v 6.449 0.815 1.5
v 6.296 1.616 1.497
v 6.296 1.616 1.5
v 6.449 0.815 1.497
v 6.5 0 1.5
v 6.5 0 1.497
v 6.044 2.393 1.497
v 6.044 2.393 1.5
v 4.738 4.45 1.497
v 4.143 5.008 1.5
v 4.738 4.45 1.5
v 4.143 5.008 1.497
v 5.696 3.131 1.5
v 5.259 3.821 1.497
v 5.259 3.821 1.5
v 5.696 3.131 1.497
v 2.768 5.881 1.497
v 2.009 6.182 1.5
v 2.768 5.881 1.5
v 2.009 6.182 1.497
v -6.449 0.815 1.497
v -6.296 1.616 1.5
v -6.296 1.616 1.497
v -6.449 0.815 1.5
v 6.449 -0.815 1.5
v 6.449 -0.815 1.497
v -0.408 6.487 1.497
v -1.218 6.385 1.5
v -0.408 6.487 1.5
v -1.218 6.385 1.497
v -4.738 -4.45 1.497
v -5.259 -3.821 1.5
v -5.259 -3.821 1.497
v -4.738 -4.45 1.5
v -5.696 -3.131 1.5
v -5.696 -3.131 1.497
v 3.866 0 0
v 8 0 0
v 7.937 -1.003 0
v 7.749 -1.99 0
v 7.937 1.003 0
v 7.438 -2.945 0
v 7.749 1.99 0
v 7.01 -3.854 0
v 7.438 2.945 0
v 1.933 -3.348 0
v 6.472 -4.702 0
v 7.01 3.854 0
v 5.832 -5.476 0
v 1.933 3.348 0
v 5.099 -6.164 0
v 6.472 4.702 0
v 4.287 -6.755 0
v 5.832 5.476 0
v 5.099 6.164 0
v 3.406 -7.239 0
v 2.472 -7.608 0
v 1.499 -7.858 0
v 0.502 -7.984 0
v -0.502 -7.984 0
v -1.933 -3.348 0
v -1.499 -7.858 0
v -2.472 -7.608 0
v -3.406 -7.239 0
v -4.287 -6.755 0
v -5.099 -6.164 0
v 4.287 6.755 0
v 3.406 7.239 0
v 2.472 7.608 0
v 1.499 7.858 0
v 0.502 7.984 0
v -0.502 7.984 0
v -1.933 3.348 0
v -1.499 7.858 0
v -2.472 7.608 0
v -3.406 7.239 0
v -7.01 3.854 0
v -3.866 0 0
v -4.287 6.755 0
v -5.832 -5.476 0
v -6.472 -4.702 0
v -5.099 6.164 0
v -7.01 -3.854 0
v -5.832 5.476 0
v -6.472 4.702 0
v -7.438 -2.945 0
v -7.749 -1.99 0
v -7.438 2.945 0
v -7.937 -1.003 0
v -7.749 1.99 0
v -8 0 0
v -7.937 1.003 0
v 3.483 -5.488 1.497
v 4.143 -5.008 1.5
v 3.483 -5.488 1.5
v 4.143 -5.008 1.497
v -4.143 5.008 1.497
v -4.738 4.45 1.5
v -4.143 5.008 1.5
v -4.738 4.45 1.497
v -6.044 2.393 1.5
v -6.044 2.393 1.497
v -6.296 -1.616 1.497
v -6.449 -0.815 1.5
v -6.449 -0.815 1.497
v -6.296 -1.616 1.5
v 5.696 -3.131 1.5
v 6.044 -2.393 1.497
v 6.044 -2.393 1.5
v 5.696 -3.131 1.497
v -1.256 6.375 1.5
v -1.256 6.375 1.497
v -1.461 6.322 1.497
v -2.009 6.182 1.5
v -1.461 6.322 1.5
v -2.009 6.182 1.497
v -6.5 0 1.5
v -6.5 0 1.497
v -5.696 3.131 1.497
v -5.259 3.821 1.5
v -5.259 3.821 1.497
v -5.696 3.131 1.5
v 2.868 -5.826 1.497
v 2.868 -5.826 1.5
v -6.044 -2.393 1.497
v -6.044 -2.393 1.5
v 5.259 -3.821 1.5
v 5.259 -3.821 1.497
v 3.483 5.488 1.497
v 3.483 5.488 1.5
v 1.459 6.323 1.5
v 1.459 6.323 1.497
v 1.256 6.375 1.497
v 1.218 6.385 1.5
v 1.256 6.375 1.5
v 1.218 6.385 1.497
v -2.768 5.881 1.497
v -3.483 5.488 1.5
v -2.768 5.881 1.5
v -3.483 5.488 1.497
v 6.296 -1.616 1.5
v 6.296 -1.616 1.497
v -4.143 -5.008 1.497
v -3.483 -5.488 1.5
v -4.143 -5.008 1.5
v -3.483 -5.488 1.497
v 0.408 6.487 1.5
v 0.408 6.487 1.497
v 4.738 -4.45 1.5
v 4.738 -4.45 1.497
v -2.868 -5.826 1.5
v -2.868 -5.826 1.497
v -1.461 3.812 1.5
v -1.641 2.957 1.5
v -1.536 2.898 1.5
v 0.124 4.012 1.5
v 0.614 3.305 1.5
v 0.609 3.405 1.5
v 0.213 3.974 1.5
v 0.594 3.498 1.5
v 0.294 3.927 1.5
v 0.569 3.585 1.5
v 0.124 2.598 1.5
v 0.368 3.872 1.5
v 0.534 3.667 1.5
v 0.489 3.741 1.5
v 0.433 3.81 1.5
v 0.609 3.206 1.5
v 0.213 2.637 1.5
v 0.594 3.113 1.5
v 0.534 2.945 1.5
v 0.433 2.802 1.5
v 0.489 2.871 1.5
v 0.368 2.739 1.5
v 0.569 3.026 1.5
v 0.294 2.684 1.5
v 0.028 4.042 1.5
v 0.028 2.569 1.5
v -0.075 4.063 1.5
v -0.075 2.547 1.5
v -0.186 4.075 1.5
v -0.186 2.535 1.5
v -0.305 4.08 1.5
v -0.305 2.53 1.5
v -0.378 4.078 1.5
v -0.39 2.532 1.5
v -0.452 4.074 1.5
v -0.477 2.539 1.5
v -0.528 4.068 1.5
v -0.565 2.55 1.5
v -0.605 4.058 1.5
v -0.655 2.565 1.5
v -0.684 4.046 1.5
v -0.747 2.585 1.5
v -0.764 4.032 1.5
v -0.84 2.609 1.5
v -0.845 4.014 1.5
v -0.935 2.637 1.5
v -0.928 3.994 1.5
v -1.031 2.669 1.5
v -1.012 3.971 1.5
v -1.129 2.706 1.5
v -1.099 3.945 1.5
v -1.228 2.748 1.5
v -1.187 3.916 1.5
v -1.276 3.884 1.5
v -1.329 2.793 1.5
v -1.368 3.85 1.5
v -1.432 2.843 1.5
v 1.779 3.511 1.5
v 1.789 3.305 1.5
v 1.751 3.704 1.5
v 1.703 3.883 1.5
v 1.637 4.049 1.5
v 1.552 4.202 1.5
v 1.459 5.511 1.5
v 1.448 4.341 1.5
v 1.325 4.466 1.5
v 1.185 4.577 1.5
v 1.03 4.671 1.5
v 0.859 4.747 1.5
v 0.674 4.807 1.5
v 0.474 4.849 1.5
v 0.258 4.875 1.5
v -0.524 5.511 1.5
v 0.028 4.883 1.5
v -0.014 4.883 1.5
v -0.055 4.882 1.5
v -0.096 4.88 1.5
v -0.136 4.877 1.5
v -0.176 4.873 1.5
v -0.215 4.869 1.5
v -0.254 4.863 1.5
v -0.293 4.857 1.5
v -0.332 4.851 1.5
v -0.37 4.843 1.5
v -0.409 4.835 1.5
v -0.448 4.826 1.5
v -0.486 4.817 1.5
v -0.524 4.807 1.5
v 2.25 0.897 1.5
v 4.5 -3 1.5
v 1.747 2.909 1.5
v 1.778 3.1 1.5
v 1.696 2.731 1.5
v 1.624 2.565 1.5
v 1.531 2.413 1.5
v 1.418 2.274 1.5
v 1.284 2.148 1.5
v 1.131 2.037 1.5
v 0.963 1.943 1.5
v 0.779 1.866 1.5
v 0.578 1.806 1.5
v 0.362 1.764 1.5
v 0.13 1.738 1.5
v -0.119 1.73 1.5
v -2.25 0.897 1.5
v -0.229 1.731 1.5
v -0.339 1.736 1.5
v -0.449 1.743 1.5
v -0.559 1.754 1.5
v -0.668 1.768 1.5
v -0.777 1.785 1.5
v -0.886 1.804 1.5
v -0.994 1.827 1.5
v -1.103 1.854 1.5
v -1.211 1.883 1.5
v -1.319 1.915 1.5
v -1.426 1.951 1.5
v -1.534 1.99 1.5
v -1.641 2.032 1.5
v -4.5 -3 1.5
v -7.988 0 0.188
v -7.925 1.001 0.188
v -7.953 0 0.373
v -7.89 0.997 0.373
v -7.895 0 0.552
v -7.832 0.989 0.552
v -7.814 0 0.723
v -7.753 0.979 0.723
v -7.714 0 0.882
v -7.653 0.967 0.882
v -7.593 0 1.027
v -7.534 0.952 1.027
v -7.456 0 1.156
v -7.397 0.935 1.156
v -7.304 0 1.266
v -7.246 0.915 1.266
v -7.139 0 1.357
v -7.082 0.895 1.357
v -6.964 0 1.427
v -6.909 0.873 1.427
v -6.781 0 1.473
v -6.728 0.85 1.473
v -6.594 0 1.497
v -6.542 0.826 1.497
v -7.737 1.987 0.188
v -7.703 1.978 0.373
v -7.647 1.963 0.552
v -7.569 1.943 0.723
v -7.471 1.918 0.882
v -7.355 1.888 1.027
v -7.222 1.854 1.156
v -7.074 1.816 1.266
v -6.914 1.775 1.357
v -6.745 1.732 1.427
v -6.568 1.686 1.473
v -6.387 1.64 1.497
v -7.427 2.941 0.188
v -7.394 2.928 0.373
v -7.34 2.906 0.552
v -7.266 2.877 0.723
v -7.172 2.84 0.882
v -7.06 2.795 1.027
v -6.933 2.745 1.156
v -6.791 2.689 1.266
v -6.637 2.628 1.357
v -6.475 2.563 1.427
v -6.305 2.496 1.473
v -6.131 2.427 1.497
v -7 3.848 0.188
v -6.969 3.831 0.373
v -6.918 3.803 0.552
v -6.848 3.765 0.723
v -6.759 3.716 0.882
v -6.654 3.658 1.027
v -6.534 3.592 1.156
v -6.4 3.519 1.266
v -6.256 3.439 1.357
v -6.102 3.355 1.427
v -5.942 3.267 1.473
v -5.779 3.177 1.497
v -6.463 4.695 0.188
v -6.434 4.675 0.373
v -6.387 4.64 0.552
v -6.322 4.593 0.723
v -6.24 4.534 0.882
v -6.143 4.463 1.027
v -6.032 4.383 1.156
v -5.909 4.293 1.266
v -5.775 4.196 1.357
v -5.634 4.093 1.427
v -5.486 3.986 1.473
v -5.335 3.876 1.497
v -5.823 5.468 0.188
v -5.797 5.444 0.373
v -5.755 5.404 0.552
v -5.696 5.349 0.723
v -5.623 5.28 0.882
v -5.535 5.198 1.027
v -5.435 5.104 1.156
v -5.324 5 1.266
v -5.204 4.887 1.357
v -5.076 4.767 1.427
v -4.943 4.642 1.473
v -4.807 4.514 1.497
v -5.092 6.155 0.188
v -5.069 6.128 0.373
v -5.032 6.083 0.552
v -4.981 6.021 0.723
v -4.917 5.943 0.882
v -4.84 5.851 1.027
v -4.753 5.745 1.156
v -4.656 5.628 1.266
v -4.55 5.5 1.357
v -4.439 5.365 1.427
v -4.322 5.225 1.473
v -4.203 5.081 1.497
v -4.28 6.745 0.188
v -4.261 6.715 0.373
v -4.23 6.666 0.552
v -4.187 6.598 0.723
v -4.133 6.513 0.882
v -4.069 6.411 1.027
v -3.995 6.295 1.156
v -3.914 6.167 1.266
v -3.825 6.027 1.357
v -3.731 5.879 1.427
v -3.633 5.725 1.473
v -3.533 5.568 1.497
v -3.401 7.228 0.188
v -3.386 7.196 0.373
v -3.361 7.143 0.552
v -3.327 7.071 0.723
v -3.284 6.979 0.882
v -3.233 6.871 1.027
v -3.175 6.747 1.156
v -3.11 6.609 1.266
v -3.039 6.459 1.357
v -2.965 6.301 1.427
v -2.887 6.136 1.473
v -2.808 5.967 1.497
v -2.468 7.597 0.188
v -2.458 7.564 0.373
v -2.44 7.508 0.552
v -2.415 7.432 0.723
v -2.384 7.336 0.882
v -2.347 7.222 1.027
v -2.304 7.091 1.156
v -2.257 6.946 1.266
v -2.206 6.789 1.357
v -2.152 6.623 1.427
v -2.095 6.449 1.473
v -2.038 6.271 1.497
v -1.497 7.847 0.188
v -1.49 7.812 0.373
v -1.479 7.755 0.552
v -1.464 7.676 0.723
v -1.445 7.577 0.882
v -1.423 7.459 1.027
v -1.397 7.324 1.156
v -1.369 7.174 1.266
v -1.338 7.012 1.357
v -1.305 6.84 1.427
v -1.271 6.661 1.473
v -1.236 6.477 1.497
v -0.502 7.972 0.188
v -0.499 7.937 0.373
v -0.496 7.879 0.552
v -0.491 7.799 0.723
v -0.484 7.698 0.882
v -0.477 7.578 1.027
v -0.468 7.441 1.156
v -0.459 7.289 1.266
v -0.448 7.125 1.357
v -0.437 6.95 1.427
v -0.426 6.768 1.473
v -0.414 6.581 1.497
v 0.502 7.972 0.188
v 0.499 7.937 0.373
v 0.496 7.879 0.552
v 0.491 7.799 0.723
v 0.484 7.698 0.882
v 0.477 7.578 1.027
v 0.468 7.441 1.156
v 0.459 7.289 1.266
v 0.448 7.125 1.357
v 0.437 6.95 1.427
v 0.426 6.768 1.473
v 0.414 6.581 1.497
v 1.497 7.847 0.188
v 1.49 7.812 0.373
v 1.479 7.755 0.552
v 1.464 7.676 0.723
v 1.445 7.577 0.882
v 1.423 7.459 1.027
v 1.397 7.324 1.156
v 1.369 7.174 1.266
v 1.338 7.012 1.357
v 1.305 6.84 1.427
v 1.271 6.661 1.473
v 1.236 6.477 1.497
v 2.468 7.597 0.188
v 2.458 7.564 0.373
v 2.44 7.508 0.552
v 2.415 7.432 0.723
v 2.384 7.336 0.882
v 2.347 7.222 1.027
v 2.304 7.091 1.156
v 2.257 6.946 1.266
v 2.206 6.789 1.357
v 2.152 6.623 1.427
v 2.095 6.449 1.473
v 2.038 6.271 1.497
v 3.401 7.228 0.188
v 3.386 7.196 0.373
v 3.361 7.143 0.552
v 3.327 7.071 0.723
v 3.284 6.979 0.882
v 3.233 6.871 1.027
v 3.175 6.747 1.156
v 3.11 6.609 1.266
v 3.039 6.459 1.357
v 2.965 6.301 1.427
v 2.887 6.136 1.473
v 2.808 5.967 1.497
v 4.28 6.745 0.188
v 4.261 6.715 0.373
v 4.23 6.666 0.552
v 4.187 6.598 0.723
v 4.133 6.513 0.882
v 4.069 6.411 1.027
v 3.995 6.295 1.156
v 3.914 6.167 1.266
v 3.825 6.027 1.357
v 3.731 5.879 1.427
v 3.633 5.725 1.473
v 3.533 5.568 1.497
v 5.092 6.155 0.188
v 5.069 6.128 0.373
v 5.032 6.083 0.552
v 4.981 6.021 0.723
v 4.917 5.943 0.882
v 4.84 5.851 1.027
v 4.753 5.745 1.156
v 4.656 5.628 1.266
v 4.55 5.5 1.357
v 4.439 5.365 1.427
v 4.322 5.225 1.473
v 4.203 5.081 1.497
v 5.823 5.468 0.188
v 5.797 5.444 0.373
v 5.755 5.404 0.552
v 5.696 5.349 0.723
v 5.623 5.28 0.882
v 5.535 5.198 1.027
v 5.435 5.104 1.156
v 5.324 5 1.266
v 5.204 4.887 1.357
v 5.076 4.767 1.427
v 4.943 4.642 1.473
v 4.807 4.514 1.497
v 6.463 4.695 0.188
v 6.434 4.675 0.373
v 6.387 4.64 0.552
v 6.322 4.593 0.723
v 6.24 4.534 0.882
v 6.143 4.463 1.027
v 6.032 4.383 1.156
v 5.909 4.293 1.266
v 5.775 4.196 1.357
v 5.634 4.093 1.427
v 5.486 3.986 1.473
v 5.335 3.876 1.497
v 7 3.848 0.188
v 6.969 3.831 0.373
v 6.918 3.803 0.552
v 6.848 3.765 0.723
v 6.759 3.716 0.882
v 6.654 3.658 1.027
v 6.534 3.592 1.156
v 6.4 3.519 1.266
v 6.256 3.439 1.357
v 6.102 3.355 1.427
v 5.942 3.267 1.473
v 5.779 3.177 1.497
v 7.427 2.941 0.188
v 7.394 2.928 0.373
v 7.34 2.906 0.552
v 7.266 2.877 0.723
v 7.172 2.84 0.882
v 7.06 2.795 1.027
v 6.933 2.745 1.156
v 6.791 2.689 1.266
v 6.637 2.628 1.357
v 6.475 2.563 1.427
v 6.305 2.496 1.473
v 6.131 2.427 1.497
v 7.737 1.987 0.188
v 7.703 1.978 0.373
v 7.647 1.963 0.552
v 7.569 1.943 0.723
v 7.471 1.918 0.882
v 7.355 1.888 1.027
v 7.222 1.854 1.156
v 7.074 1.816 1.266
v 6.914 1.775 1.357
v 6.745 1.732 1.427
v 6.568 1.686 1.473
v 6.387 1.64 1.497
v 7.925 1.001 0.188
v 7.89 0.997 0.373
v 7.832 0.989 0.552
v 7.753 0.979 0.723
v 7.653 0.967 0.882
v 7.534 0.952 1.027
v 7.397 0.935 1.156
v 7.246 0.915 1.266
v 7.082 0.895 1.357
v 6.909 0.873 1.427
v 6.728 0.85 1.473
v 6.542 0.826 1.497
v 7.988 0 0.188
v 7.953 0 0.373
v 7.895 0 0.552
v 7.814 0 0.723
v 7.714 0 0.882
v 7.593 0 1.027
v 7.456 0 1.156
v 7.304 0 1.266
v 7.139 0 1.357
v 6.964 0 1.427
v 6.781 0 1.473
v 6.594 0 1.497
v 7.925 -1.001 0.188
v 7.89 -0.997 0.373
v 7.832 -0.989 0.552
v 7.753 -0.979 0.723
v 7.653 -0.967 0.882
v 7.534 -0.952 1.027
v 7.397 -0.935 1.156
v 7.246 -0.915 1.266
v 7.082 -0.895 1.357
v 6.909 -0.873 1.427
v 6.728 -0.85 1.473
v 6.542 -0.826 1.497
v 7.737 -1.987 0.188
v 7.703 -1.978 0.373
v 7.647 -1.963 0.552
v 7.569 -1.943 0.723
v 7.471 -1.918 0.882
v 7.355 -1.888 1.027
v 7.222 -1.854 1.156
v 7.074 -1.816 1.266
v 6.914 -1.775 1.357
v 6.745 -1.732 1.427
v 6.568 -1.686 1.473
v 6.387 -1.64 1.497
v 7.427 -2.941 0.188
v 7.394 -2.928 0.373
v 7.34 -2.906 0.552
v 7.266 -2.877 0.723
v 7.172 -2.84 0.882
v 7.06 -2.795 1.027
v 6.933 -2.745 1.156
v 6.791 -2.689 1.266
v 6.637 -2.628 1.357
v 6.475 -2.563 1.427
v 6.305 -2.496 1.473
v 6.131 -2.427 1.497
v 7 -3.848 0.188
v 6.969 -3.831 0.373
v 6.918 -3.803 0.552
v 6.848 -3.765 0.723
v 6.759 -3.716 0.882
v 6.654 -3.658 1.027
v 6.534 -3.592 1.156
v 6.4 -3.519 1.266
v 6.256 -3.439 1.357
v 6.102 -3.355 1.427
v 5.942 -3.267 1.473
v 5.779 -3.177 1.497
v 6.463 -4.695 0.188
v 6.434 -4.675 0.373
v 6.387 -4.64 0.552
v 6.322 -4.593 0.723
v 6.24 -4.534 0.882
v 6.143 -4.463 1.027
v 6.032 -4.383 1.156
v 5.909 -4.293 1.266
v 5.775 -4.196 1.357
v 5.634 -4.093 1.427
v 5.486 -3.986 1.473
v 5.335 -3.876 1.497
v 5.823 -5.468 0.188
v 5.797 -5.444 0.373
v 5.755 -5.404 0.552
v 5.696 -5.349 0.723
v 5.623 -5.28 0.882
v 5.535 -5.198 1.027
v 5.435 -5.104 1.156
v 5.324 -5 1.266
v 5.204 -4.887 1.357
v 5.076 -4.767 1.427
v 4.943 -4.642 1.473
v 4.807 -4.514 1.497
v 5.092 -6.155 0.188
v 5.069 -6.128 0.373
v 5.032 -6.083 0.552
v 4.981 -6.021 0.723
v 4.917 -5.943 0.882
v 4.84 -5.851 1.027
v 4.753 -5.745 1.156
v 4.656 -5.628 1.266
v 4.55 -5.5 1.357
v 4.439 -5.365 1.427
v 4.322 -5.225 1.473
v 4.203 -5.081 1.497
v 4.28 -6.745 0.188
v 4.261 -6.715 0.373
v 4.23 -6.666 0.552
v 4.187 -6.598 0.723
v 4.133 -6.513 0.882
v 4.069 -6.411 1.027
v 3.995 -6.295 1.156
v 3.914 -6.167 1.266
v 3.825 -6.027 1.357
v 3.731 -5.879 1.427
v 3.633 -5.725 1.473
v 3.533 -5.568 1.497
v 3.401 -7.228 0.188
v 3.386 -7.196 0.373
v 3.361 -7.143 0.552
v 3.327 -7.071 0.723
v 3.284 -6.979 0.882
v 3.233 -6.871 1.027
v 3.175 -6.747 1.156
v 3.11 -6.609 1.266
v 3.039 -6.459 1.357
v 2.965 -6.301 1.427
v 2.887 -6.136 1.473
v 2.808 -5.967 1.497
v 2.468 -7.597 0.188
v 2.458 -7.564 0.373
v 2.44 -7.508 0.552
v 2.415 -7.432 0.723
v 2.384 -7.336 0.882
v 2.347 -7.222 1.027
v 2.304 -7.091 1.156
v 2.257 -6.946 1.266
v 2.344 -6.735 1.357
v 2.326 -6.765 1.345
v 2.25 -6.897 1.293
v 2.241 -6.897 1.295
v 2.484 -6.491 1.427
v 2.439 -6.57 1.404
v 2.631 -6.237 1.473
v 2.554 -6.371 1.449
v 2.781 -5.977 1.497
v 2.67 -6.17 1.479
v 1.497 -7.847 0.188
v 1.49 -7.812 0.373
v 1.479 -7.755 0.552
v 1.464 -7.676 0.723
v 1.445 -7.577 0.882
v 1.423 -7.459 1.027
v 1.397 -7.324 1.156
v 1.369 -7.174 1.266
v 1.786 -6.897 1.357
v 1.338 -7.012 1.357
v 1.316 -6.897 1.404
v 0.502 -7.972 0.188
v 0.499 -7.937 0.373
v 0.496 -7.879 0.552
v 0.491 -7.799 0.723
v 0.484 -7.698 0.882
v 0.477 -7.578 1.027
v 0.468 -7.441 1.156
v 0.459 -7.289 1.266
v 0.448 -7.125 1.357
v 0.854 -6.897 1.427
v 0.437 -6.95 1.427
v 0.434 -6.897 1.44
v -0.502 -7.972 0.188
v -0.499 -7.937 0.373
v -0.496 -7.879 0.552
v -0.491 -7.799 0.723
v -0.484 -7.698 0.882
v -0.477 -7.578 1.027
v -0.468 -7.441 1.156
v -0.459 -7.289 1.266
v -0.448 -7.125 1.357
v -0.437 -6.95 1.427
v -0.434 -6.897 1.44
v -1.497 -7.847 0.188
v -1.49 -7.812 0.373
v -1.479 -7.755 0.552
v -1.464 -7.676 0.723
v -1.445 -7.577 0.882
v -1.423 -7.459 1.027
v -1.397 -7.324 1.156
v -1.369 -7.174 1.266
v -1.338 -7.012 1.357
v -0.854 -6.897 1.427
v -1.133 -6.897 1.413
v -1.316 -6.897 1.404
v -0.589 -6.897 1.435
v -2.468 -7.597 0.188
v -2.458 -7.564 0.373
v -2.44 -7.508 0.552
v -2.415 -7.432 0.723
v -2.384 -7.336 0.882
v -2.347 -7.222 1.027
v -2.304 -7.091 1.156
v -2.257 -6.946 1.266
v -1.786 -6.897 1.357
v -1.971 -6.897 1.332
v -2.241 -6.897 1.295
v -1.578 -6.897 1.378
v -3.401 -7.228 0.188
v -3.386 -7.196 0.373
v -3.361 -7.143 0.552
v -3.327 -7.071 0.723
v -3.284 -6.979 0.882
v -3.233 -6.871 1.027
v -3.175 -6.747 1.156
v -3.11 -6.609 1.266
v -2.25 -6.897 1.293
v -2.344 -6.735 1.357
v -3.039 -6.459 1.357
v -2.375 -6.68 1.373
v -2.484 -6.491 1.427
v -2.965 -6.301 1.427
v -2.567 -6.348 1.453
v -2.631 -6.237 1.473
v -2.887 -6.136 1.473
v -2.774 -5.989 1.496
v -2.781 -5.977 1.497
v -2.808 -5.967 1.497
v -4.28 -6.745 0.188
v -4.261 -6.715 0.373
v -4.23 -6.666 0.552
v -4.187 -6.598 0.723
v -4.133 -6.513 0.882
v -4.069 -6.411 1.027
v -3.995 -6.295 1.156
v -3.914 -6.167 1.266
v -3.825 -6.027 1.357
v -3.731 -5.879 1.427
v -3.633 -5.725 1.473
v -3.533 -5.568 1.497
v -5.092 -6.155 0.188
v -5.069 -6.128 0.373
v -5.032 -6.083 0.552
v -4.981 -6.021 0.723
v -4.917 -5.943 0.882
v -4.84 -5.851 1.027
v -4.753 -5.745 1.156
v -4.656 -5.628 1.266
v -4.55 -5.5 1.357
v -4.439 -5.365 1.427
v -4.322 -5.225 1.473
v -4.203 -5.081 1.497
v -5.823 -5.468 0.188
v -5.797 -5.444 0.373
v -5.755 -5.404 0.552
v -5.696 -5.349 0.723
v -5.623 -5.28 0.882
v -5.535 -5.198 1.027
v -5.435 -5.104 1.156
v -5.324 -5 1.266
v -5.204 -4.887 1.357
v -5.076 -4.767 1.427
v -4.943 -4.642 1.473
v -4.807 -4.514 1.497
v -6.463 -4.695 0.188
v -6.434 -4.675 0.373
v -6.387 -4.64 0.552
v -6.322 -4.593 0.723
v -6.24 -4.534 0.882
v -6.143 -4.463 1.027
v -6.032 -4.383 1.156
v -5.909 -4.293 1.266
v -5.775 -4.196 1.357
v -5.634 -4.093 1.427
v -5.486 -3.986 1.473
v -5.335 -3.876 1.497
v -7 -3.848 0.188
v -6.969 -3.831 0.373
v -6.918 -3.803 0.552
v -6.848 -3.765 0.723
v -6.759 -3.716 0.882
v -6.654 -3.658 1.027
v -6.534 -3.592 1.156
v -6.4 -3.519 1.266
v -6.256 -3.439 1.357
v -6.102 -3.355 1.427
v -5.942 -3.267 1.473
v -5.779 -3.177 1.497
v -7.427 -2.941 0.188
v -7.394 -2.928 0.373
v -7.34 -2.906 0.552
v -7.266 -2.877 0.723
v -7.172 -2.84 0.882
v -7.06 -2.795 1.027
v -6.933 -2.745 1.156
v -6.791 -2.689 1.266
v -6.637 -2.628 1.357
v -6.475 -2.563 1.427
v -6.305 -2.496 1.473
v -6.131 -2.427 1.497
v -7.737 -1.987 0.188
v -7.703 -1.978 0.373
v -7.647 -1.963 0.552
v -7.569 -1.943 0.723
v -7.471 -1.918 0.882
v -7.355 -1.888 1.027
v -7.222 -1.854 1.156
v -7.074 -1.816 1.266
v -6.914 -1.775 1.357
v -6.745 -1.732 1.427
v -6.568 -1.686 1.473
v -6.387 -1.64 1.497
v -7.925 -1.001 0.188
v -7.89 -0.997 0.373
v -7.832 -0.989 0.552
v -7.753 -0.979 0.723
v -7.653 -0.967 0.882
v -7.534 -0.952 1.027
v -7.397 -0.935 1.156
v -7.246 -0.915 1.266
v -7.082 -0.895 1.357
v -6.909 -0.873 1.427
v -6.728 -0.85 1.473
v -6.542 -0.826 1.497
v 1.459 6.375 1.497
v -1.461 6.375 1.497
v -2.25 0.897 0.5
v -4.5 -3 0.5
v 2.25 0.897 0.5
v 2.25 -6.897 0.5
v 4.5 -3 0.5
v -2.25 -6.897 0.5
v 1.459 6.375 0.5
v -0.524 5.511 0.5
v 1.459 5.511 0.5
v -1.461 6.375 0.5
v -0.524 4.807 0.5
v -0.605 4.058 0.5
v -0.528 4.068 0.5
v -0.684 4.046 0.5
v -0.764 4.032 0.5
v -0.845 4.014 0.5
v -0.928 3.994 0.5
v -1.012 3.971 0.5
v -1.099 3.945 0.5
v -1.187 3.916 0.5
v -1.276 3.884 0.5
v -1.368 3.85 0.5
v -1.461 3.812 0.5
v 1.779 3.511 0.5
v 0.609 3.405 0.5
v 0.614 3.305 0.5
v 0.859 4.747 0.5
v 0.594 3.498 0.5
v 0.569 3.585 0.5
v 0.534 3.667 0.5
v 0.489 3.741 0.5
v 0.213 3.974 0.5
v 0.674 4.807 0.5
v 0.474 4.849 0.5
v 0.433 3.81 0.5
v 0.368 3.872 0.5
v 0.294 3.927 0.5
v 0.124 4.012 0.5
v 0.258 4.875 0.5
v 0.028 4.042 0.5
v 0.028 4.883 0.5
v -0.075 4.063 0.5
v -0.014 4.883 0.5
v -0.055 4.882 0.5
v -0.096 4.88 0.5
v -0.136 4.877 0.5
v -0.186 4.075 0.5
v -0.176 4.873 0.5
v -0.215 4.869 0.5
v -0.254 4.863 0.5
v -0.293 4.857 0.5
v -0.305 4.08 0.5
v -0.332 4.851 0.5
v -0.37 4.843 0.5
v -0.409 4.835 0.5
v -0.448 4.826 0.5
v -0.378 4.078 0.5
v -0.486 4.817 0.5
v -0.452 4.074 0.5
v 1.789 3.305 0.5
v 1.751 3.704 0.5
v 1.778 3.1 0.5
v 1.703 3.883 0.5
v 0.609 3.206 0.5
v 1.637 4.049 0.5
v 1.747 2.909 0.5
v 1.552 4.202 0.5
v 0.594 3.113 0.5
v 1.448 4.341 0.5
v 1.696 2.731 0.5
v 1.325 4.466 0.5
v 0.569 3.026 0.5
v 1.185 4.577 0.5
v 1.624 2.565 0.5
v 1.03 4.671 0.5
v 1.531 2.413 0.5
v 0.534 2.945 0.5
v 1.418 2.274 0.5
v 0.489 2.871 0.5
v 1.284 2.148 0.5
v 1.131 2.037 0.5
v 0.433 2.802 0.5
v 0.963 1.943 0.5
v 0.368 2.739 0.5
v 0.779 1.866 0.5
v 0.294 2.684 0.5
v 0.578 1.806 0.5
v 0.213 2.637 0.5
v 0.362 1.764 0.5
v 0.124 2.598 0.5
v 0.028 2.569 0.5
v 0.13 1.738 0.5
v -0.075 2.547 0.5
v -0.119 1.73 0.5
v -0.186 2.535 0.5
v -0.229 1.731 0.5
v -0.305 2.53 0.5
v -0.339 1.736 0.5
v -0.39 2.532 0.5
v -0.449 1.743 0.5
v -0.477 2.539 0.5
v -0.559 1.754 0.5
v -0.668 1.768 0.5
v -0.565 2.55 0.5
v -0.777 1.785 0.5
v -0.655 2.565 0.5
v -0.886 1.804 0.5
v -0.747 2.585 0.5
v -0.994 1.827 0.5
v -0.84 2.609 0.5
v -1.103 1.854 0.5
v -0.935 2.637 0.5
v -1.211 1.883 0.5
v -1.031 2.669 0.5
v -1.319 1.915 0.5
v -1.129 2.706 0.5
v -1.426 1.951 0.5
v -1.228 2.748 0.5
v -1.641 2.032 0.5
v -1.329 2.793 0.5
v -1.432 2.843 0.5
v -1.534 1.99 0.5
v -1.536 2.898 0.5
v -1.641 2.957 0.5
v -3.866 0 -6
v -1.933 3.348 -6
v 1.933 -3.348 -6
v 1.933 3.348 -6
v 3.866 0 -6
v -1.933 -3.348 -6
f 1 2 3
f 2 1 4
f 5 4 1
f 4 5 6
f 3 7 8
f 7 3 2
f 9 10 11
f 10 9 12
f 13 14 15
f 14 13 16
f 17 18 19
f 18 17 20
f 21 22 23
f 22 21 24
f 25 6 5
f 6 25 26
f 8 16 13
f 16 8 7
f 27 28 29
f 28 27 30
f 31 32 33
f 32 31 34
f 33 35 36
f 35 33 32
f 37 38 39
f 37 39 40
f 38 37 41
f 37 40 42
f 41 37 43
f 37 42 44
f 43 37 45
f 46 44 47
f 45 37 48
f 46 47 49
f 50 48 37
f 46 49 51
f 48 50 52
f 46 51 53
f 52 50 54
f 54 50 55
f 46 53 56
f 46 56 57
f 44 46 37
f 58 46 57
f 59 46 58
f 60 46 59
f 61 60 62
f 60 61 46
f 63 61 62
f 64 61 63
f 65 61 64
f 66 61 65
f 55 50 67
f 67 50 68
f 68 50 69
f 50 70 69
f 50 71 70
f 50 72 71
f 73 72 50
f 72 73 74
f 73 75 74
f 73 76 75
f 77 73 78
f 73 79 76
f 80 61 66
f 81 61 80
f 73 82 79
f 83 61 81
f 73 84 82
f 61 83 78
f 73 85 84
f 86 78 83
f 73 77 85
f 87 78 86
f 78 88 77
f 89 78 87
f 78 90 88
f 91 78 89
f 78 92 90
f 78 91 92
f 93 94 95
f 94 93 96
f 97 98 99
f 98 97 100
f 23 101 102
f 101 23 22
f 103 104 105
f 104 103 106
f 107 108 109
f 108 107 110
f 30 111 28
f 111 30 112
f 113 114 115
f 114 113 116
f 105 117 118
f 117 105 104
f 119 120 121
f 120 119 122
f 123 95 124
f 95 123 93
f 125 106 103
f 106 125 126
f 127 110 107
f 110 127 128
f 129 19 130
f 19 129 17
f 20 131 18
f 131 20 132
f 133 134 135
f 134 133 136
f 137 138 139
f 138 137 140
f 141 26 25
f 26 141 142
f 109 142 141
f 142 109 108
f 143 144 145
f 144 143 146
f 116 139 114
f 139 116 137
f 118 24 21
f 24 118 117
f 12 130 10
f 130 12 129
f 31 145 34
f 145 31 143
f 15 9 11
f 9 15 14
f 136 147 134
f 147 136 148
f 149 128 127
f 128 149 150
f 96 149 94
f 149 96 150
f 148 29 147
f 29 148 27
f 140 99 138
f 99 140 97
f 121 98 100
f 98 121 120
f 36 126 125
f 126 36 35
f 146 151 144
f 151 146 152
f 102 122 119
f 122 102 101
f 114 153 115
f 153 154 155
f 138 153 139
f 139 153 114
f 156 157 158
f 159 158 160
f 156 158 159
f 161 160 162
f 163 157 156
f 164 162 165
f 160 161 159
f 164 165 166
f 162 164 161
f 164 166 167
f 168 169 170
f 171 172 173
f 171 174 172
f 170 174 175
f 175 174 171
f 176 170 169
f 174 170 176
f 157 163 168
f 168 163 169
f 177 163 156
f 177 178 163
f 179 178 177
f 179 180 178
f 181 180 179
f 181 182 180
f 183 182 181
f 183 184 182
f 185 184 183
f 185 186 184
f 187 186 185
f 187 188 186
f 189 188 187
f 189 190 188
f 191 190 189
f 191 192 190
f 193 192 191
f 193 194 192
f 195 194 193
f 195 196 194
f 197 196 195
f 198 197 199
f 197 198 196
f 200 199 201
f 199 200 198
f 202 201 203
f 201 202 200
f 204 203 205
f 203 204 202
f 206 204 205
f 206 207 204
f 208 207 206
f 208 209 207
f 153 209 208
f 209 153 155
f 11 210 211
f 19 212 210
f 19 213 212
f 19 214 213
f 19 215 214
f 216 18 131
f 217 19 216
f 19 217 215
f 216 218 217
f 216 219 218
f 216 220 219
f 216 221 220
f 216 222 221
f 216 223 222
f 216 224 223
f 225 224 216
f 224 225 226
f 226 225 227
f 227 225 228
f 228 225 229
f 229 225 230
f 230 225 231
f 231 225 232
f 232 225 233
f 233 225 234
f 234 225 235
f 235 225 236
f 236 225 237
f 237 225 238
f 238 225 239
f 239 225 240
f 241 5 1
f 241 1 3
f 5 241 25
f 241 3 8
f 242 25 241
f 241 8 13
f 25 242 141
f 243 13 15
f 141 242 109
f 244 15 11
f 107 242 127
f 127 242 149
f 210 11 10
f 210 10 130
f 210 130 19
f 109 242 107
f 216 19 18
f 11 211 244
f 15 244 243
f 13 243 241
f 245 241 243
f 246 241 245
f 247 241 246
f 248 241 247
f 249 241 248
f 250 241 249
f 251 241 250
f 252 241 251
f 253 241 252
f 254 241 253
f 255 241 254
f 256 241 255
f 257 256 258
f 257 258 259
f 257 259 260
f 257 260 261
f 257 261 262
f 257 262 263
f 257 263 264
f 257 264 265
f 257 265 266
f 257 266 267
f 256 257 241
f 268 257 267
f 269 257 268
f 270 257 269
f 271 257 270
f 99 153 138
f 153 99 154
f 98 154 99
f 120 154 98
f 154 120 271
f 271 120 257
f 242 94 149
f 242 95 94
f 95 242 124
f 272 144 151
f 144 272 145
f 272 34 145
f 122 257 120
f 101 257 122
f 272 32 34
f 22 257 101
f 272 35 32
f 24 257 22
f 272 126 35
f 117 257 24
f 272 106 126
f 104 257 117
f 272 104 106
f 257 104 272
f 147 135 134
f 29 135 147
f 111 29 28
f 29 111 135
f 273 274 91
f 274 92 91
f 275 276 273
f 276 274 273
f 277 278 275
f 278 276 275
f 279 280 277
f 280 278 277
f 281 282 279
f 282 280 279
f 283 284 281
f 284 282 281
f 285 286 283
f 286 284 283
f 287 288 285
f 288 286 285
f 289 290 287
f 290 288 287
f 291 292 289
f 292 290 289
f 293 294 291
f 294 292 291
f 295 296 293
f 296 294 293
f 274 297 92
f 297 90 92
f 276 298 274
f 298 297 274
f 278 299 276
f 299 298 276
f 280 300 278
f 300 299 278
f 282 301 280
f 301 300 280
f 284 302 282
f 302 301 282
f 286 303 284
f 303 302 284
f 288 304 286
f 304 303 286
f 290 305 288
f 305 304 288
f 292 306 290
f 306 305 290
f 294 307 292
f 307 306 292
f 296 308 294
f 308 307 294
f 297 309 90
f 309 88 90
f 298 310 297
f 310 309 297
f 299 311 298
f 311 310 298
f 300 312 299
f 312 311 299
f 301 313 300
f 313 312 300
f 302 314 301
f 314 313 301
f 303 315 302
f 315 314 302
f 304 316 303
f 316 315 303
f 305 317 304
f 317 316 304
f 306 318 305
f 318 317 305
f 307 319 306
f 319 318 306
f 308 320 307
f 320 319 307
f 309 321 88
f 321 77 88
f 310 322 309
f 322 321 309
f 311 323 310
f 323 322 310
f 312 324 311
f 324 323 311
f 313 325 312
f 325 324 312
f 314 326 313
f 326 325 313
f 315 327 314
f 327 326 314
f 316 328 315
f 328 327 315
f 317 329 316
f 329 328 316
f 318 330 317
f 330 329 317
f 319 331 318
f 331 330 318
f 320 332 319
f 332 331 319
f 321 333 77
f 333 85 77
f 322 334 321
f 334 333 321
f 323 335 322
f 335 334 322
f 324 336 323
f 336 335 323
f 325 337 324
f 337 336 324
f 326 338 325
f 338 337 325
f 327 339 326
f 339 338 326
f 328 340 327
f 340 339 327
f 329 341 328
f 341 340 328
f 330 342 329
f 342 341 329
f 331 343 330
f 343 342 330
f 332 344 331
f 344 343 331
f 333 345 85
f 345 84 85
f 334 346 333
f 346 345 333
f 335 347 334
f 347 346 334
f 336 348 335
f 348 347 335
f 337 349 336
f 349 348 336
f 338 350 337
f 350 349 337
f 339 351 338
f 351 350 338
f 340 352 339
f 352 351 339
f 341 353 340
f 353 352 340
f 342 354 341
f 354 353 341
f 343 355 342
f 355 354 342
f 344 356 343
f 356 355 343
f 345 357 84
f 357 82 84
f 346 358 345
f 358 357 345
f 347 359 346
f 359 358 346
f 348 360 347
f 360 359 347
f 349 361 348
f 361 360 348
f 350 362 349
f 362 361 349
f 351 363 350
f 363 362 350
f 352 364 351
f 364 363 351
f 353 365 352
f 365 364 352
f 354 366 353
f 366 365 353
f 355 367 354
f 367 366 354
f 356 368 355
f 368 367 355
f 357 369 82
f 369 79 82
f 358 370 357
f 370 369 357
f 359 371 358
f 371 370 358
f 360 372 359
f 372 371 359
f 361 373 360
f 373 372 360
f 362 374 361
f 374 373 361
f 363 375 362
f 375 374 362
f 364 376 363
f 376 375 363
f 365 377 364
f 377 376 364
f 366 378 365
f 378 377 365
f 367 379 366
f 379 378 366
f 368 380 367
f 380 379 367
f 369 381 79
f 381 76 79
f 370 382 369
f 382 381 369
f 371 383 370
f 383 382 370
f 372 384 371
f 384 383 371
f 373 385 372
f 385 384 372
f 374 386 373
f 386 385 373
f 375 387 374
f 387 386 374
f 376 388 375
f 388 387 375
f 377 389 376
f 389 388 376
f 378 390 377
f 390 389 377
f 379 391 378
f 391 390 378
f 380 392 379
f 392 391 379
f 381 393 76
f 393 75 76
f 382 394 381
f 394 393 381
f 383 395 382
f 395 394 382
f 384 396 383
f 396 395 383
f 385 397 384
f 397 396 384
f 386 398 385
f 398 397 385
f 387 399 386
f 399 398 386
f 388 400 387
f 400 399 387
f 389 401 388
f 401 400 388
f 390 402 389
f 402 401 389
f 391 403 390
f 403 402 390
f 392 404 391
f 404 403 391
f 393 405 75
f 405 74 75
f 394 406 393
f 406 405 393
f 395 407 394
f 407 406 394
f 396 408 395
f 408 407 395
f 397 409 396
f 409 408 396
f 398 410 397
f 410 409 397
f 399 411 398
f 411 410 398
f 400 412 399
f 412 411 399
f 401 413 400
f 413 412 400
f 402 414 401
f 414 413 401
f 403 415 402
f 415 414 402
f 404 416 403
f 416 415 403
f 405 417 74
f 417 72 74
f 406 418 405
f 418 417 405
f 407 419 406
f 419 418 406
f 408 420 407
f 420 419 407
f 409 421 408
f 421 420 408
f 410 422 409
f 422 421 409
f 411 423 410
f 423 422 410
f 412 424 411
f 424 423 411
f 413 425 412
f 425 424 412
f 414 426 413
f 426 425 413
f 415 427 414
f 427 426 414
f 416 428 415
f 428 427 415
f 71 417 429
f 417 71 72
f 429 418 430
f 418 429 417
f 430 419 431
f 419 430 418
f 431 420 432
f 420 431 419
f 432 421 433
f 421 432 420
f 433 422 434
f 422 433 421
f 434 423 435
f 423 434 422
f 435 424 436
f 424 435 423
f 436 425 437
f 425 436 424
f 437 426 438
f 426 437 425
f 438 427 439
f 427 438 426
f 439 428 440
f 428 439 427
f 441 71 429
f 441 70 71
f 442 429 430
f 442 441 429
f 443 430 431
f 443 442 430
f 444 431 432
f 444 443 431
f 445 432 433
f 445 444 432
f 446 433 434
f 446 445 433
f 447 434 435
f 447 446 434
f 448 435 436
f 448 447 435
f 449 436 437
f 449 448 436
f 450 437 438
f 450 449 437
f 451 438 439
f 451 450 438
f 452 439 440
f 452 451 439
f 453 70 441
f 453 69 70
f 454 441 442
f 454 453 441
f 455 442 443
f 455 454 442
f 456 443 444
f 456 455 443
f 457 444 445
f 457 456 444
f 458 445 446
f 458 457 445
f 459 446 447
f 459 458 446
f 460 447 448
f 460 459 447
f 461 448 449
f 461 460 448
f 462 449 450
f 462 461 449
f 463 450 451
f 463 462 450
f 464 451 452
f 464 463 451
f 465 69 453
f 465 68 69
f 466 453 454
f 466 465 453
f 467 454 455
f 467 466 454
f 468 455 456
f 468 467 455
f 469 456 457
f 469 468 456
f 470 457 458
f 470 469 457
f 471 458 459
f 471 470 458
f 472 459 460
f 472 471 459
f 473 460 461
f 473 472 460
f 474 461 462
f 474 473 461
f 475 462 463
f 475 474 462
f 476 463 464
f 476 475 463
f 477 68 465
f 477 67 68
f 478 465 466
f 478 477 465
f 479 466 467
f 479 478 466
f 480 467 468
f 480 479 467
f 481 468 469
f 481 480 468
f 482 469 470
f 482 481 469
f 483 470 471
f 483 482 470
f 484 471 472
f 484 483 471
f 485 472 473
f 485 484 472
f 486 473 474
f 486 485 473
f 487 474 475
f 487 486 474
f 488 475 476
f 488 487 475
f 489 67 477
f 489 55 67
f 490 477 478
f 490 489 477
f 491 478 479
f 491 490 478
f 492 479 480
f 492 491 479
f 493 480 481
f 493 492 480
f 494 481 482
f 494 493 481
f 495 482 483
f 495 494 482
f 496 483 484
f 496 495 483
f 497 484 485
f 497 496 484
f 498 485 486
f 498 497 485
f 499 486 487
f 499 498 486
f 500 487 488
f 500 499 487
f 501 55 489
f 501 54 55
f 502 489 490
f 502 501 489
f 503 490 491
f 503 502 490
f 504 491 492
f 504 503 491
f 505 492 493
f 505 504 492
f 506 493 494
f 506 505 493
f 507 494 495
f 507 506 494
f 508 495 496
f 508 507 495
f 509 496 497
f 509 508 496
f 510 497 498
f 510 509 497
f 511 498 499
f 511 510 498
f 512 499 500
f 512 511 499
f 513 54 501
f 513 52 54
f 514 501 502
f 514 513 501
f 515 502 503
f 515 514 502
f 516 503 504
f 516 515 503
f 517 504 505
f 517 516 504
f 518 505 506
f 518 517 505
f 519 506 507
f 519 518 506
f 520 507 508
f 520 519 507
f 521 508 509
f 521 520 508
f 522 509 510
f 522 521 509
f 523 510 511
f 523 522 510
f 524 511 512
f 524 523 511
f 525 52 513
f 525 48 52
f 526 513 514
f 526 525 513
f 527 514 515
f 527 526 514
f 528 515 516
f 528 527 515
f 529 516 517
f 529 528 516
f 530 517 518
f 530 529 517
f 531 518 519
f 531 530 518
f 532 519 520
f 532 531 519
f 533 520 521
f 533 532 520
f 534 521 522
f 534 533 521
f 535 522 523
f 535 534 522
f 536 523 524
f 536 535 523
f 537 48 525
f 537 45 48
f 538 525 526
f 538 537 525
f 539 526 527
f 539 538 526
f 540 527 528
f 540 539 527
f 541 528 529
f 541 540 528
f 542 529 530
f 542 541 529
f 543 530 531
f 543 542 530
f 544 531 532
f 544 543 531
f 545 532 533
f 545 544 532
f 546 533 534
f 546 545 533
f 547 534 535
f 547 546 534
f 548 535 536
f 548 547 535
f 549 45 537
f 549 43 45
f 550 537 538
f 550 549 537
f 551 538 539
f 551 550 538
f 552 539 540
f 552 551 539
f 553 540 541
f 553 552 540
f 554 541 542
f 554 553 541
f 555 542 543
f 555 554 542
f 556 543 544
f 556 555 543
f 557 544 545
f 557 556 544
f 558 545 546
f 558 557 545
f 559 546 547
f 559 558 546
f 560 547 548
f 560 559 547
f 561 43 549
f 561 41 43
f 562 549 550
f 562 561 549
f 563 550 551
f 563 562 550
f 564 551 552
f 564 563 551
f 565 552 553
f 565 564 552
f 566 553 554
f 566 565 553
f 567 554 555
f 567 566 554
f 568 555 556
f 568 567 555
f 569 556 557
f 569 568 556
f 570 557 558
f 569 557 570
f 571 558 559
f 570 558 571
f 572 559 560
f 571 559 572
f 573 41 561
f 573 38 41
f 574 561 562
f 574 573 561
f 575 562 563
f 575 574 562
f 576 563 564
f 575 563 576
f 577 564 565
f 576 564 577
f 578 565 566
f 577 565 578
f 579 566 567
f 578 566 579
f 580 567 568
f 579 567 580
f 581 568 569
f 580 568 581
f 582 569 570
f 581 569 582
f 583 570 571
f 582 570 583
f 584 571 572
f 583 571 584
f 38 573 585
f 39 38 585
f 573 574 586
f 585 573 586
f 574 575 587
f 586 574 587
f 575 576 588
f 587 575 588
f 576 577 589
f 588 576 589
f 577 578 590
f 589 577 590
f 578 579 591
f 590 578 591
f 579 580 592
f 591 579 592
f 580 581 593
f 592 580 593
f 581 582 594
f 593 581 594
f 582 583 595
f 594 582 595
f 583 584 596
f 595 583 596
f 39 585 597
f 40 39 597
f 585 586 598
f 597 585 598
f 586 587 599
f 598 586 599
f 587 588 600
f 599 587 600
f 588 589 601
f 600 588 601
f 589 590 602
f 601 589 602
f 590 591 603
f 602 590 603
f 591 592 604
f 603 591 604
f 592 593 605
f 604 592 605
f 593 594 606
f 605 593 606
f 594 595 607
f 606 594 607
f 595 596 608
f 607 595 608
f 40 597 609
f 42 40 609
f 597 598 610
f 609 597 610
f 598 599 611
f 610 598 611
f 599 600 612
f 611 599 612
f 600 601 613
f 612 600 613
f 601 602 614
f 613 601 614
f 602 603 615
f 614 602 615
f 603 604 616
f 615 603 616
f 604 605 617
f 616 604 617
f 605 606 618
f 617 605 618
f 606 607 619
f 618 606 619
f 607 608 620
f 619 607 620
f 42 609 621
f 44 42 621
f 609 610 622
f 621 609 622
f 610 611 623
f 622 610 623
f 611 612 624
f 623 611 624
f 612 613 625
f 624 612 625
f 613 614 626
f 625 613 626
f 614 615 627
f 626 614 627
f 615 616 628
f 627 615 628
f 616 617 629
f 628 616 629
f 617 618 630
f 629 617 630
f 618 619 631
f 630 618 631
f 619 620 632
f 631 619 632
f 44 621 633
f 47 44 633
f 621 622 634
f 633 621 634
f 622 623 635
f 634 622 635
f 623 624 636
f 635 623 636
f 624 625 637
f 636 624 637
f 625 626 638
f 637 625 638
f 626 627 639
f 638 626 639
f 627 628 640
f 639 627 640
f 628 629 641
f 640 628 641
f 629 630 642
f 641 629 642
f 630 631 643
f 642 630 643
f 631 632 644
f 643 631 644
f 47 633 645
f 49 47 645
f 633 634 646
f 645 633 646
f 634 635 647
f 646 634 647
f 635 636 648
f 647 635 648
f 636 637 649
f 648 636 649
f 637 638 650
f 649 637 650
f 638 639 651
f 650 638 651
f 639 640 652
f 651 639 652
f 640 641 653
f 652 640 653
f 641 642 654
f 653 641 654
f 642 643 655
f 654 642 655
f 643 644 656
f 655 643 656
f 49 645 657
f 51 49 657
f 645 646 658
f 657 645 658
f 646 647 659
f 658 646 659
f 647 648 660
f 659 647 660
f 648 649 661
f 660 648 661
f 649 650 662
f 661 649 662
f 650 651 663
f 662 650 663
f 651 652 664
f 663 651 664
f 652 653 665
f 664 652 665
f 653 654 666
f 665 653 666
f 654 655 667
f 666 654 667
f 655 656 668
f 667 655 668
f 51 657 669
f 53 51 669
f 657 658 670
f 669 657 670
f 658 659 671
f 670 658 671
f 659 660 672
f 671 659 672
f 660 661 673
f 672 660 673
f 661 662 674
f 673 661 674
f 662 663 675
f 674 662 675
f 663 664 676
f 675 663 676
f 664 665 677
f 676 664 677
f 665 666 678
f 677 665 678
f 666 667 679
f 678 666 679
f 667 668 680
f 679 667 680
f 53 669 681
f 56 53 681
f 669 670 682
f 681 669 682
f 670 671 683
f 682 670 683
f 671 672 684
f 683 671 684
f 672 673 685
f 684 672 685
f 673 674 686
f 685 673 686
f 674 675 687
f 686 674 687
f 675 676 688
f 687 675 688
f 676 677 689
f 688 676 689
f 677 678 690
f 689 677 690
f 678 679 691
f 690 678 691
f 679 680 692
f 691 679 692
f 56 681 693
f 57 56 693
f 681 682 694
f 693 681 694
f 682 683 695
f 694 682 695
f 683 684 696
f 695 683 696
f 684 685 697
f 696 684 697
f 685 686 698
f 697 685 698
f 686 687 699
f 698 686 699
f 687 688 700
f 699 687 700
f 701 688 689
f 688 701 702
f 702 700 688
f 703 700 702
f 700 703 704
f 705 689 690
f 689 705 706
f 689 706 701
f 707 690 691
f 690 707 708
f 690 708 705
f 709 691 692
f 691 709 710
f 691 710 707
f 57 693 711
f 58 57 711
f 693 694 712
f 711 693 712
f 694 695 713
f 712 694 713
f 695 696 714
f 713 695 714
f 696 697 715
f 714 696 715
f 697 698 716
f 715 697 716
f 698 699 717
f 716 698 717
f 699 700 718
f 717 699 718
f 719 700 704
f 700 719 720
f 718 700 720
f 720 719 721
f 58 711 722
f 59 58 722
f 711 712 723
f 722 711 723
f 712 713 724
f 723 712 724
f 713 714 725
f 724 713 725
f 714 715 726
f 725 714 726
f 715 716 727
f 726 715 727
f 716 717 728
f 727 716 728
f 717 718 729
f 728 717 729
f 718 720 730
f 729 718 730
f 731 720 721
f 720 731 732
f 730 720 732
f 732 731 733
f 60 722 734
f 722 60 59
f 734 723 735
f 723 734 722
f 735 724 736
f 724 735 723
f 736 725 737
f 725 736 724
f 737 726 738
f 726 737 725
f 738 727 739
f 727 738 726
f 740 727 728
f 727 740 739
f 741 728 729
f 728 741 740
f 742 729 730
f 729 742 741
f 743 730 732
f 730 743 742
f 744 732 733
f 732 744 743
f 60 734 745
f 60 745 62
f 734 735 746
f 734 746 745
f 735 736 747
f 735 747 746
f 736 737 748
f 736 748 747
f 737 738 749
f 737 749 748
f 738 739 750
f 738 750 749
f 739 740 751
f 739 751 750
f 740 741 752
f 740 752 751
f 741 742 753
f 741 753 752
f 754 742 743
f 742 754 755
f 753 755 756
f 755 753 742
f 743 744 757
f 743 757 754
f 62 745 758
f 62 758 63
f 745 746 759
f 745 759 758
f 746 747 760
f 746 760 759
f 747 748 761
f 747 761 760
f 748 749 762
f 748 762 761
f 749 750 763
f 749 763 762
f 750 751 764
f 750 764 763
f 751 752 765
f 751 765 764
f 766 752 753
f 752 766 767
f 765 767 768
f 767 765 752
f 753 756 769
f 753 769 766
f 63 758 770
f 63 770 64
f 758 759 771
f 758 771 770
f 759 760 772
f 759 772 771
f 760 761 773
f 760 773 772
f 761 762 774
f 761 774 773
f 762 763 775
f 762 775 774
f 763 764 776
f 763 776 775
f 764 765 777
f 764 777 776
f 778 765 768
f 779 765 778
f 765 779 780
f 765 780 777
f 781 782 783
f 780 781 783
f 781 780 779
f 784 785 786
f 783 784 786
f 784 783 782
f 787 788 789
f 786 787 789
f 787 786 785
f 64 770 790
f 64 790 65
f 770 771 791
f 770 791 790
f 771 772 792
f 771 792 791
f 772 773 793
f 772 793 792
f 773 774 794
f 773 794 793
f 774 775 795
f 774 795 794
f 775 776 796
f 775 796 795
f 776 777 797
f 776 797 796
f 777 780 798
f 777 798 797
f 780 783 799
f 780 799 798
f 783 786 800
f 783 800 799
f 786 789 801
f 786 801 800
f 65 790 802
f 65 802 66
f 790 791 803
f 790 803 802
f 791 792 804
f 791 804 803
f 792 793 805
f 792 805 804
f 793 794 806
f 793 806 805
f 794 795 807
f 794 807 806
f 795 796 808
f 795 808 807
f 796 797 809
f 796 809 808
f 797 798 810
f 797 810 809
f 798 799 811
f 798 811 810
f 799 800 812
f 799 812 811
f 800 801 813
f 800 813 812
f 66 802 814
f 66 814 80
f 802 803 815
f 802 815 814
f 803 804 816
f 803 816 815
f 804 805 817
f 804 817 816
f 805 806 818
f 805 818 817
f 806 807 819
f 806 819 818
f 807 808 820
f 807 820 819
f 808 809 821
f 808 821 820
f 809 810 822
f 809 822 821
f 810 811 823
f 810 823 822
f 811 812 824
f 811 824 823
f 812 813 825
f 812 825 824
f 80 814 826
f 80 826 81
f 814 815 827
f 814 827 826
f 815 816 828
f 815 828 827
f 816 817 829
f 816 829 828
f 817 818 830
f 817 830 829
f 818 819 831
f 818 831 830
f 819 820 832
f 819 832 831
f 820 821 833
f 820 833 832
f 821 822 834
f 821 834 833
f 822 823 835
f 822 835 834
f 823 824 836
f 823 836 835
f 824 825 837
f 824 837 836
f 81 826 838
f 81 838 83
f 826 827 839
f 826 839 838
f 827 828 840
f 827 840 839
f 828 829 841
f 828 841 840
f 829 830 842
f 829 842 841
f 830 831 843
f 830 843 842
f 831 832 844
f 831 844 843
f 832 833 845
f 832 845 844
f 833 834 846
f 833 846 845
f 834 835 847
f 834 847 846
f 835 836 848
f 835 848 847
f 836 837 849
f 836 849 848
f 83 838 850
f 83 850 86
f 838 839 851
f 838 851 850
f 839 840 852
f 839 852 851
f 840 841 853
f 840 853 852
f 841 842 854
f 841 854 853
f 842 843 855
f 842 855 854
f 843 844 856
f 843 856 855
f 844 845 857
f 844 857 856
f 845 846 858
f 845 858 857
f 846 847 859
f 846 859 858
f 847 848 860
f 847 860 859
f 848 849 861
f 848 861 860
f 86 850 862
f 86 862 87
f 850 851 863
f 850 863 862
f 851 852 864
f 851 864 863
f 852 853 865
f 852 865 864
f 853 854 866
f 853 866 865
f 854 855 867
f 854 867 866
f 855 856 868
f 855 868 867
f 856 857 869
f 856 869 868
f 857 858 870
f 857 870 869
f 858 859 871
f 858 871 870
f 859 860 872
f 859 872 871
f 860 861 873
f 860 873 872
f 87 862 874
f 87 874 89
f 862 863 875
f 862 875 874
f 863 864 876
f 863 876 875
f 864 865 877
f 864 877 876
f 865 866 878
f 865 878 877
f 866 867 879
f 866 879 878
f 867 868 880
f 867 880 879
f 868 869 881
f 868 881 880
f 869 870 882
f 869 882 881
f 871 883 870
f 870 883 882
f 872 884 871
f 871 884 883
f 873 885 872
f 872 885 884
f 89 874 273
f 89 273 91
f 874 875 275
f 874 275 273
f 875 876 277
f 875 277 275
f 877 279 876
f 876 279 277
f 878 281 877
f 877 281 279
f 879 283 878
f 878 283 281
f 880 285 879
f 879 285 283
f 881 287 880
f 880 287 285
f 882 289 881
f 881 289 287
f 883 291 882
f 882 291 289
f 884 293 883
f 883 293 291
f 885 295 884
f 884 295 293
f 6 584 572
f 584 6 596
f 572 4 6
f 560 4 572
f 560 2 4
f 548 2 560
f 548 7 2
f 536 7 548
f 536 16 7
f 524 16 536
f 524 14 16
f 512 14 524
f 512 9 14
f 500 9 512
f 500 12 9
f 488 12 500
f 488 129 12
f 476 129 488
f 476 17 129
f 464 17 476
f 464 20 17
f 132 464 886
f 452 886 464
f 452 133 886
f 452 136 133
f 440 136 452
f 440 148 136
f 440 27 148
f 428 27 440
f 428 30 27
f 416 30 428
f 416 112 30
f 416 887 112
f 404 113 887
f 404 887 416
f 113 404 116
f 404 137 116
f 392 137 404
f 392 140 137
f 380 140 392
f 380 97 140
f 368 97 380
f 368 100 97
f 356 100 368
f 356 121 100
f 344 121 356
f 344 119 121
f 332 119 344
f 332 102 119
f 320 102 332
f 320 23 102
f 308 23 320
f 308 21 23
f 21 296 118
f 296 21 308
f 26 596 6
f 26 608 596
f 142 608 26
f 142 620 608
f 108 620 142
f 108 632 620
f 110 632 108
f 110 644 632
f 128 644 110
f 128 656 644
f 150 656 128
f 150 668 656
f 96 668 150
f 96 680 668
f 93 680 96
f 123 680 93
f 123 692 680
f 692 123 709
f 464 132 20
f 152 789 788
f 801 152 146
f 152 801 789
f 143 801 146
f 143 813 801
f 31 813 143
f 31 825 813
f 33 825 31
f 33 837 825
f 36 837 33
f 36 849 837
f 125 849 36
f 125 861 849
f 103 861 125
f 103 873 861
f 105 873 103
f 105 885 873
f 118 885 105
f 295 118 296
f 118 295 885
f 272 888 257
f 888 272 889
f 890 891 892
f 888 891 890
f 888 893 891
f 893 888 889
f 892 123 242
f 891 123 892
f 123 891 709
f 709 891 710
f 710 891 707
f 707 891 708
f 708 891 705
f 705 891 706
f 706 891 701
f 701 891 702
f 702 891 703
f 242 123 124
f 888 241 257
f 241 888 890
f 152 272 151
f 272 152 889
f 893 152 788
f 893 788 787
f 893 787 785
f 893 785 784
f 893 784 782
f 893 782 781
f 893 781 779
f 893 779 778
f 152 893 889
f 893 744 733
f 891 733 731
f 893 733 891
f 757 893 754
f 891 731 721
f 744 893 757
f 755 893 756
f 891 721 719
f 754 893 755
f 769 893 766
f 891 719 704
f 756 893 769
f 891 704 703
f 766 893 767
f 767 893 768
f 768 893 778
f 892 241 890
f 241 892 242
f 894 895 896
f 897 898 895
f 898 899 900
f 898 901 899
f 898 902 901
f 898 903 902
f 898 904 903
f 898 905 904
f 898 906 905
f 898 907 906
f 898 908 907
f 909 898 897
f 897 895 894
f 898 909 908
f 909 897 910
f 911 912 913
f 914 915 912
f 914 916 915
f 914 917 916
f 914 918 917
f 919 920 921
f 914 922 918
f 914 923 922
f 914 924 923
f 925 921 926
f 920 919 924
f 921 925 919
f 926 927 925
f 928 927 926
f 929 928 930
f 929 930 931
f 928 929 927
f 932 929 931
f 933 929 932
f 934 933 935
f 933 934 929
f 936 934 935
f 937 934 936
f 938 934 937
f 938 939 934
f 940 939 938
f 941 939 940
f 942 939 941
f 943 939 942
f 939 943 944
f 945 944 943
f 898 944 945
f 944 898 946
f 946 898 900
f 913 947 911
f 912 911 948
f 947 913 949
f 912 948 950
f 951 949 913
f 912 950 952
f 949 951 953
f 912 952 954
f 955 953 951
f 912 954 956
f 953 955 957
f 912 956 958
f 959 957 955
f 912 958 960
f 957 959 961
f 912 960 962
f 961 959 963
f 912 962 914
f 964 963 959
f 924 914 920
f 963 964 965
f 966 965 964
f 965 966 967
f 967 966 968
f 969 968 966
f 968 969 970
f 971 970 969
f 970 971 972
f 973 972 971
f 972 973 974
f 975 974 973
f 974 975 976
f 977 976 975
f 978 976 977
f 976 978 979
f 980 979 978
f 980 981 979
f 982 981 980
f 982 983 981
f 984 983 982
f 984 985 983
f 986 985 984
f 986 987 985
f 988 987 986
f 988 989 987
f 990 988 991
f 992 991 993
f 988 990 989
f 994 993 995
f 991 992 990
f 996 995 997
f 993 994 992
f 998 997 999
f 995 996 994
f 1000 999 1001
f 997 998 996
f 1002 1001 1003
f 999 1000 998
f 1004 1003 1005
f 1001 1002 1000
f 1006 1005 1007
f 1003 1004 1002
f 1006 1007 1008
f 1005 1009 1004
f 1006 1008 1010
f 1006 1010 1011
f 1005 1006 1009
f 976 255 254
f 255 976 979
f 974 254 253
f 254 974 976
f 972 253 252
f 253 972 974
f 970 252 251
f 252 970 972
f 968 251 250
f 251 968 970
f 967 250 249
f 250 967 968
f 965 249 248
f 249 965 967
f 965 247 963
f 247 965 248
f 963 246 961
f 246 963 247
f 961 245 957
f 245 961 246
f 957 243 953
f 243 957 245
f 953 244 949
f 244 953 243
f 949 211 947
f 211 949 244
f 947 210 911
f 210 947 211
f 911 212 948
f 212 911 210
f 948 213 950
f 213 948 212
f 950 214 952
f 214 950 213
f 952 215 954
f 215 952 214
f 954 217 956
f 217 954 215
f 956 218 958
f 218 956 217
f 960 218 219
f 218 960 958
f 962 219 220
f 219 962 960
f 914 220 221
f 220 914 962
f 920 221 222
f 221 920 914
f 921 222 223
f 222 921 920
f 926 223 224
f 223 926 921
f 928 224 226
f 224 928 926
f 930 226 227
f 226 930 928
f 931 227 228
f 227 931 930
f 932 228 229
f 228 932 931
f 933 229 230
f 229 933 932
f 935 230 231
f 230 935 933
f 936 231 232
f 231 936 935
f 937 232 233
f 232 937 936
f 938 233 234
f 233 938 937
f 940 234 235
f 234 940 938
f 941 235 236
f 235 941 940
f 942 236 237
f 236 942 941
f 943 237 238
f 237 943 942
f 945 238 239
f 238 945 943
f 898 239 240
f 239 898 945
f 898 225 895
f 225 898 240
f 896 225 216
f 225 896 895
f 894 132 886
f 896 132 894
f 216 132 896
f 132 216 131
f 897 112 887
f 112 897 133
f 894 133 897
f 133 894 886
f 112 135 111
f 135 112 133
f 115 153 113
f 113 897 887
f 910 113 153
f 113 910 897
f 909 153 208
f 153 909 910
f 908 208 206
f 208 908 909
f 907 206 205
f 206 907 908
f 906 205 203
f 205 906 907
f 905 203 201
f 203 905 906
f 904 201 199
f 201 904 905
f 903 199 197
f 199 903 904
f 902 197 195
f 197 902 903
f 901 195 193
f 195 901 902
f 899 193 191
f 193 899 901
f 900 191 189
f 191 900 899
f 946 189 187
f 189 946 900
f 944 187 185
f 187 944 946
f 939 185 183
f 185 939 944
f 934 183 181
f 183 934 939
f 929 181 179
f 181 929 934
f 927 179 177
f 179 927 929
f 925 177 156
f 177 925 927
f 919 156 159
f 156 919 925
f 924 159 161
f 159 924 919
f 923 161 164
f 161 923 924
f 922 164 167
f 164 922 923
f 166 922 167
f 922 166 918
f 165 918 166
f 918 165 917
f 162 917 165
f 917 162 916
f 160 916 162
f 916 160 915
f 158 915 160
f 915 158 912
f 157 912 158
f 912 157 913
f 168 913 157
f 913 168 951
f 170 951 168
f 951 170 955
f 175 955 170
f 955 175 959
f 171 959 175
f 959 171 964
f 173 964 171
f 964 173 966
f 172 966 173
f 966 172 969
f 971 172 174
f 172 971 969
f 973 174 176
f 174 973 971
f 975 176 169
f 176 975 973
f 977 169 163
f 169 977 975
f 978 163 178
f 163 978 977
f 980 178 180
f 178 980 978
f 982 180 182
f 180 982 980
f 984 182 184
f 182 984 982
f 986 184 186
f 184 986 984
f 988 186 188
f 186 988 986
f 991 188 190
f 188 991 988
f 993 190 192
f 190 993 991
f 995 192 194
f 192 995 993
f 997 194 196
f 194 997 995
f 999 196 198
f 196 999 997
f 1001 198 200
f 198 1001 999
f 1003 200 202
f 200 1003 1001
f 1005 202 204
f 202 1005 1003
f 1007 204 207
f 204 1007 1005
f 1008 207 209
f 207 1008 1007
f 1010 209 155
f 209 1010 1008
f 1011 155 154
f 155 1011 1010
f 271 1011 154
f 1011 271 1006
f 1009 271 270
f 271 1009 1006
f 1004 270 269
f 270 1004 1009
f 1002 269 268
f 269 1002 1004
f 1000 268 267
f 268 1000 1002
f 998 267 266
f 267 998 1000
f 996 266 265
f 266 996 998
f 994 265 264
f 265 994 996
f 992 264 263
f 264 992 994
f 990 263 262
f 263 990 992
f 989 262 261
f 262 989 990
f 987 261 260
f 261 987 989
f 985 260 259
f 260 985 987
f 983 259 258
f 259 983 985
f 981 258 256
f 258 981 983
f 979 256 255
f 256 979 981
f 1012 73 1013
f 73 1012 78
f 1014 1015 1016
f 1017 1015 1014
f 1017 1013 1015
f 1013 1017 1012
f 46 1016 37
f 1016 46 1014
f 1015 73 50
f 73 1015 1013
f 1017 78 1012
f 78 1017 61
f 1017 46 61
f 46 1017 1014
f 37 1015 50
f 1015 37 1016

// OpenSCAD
$fn = 50;


union() {
	difference() {
		union() {
			cylinder(h = 1.5000000000, r = 6.5000000000);
			rotate_extrude(angle = 360) {
				translate(v = [6.5000000000, 0, 0]) {
					circle(r = 1.5000000000);
				}
			}
		}
		union() {
			translate(v = [-25.0000000000, -25.0000000000, -50]) {
				cube(size = [50, 50, 50]);
			}
			translate(v = [0, -3, 0.5000000000]) {
				#linear_extrude(height = 1) {
					polygon(points = [[4.5000000000, 0.0000000000], [2.2500000000, 3.8971143170], [-2.2500000000, 3.8971143170], [-4.5000000000, 0.0000000000], [-2.2500000000, -3.8971143170], [2.2500000000, -3.8971143170]]);
				}
			}
			#translate(v = [0, 4, 0.5000000000]) {
				linear_extrude(height = 1) {
					text(font = "SegoiUI:Bold", halign = "center", size = 4.5000000000, text = "5", valign = "center");
				}
			}
		}
	}
	union() {
		translate(v = [0, 0, -6]) {
			linear_extrude(height = 6) {
				polygon(points = [[3.8658550000, 0.0000000000], [1.9329275000, 3.3479286373], [-1.9329275000, 3.3479286373], [-3.8658550000, 0.0000000000], [-1.9329275000, -3.3479286373], [1.9329275000, -3.3479286373]]);
			}
		}
	}
}
